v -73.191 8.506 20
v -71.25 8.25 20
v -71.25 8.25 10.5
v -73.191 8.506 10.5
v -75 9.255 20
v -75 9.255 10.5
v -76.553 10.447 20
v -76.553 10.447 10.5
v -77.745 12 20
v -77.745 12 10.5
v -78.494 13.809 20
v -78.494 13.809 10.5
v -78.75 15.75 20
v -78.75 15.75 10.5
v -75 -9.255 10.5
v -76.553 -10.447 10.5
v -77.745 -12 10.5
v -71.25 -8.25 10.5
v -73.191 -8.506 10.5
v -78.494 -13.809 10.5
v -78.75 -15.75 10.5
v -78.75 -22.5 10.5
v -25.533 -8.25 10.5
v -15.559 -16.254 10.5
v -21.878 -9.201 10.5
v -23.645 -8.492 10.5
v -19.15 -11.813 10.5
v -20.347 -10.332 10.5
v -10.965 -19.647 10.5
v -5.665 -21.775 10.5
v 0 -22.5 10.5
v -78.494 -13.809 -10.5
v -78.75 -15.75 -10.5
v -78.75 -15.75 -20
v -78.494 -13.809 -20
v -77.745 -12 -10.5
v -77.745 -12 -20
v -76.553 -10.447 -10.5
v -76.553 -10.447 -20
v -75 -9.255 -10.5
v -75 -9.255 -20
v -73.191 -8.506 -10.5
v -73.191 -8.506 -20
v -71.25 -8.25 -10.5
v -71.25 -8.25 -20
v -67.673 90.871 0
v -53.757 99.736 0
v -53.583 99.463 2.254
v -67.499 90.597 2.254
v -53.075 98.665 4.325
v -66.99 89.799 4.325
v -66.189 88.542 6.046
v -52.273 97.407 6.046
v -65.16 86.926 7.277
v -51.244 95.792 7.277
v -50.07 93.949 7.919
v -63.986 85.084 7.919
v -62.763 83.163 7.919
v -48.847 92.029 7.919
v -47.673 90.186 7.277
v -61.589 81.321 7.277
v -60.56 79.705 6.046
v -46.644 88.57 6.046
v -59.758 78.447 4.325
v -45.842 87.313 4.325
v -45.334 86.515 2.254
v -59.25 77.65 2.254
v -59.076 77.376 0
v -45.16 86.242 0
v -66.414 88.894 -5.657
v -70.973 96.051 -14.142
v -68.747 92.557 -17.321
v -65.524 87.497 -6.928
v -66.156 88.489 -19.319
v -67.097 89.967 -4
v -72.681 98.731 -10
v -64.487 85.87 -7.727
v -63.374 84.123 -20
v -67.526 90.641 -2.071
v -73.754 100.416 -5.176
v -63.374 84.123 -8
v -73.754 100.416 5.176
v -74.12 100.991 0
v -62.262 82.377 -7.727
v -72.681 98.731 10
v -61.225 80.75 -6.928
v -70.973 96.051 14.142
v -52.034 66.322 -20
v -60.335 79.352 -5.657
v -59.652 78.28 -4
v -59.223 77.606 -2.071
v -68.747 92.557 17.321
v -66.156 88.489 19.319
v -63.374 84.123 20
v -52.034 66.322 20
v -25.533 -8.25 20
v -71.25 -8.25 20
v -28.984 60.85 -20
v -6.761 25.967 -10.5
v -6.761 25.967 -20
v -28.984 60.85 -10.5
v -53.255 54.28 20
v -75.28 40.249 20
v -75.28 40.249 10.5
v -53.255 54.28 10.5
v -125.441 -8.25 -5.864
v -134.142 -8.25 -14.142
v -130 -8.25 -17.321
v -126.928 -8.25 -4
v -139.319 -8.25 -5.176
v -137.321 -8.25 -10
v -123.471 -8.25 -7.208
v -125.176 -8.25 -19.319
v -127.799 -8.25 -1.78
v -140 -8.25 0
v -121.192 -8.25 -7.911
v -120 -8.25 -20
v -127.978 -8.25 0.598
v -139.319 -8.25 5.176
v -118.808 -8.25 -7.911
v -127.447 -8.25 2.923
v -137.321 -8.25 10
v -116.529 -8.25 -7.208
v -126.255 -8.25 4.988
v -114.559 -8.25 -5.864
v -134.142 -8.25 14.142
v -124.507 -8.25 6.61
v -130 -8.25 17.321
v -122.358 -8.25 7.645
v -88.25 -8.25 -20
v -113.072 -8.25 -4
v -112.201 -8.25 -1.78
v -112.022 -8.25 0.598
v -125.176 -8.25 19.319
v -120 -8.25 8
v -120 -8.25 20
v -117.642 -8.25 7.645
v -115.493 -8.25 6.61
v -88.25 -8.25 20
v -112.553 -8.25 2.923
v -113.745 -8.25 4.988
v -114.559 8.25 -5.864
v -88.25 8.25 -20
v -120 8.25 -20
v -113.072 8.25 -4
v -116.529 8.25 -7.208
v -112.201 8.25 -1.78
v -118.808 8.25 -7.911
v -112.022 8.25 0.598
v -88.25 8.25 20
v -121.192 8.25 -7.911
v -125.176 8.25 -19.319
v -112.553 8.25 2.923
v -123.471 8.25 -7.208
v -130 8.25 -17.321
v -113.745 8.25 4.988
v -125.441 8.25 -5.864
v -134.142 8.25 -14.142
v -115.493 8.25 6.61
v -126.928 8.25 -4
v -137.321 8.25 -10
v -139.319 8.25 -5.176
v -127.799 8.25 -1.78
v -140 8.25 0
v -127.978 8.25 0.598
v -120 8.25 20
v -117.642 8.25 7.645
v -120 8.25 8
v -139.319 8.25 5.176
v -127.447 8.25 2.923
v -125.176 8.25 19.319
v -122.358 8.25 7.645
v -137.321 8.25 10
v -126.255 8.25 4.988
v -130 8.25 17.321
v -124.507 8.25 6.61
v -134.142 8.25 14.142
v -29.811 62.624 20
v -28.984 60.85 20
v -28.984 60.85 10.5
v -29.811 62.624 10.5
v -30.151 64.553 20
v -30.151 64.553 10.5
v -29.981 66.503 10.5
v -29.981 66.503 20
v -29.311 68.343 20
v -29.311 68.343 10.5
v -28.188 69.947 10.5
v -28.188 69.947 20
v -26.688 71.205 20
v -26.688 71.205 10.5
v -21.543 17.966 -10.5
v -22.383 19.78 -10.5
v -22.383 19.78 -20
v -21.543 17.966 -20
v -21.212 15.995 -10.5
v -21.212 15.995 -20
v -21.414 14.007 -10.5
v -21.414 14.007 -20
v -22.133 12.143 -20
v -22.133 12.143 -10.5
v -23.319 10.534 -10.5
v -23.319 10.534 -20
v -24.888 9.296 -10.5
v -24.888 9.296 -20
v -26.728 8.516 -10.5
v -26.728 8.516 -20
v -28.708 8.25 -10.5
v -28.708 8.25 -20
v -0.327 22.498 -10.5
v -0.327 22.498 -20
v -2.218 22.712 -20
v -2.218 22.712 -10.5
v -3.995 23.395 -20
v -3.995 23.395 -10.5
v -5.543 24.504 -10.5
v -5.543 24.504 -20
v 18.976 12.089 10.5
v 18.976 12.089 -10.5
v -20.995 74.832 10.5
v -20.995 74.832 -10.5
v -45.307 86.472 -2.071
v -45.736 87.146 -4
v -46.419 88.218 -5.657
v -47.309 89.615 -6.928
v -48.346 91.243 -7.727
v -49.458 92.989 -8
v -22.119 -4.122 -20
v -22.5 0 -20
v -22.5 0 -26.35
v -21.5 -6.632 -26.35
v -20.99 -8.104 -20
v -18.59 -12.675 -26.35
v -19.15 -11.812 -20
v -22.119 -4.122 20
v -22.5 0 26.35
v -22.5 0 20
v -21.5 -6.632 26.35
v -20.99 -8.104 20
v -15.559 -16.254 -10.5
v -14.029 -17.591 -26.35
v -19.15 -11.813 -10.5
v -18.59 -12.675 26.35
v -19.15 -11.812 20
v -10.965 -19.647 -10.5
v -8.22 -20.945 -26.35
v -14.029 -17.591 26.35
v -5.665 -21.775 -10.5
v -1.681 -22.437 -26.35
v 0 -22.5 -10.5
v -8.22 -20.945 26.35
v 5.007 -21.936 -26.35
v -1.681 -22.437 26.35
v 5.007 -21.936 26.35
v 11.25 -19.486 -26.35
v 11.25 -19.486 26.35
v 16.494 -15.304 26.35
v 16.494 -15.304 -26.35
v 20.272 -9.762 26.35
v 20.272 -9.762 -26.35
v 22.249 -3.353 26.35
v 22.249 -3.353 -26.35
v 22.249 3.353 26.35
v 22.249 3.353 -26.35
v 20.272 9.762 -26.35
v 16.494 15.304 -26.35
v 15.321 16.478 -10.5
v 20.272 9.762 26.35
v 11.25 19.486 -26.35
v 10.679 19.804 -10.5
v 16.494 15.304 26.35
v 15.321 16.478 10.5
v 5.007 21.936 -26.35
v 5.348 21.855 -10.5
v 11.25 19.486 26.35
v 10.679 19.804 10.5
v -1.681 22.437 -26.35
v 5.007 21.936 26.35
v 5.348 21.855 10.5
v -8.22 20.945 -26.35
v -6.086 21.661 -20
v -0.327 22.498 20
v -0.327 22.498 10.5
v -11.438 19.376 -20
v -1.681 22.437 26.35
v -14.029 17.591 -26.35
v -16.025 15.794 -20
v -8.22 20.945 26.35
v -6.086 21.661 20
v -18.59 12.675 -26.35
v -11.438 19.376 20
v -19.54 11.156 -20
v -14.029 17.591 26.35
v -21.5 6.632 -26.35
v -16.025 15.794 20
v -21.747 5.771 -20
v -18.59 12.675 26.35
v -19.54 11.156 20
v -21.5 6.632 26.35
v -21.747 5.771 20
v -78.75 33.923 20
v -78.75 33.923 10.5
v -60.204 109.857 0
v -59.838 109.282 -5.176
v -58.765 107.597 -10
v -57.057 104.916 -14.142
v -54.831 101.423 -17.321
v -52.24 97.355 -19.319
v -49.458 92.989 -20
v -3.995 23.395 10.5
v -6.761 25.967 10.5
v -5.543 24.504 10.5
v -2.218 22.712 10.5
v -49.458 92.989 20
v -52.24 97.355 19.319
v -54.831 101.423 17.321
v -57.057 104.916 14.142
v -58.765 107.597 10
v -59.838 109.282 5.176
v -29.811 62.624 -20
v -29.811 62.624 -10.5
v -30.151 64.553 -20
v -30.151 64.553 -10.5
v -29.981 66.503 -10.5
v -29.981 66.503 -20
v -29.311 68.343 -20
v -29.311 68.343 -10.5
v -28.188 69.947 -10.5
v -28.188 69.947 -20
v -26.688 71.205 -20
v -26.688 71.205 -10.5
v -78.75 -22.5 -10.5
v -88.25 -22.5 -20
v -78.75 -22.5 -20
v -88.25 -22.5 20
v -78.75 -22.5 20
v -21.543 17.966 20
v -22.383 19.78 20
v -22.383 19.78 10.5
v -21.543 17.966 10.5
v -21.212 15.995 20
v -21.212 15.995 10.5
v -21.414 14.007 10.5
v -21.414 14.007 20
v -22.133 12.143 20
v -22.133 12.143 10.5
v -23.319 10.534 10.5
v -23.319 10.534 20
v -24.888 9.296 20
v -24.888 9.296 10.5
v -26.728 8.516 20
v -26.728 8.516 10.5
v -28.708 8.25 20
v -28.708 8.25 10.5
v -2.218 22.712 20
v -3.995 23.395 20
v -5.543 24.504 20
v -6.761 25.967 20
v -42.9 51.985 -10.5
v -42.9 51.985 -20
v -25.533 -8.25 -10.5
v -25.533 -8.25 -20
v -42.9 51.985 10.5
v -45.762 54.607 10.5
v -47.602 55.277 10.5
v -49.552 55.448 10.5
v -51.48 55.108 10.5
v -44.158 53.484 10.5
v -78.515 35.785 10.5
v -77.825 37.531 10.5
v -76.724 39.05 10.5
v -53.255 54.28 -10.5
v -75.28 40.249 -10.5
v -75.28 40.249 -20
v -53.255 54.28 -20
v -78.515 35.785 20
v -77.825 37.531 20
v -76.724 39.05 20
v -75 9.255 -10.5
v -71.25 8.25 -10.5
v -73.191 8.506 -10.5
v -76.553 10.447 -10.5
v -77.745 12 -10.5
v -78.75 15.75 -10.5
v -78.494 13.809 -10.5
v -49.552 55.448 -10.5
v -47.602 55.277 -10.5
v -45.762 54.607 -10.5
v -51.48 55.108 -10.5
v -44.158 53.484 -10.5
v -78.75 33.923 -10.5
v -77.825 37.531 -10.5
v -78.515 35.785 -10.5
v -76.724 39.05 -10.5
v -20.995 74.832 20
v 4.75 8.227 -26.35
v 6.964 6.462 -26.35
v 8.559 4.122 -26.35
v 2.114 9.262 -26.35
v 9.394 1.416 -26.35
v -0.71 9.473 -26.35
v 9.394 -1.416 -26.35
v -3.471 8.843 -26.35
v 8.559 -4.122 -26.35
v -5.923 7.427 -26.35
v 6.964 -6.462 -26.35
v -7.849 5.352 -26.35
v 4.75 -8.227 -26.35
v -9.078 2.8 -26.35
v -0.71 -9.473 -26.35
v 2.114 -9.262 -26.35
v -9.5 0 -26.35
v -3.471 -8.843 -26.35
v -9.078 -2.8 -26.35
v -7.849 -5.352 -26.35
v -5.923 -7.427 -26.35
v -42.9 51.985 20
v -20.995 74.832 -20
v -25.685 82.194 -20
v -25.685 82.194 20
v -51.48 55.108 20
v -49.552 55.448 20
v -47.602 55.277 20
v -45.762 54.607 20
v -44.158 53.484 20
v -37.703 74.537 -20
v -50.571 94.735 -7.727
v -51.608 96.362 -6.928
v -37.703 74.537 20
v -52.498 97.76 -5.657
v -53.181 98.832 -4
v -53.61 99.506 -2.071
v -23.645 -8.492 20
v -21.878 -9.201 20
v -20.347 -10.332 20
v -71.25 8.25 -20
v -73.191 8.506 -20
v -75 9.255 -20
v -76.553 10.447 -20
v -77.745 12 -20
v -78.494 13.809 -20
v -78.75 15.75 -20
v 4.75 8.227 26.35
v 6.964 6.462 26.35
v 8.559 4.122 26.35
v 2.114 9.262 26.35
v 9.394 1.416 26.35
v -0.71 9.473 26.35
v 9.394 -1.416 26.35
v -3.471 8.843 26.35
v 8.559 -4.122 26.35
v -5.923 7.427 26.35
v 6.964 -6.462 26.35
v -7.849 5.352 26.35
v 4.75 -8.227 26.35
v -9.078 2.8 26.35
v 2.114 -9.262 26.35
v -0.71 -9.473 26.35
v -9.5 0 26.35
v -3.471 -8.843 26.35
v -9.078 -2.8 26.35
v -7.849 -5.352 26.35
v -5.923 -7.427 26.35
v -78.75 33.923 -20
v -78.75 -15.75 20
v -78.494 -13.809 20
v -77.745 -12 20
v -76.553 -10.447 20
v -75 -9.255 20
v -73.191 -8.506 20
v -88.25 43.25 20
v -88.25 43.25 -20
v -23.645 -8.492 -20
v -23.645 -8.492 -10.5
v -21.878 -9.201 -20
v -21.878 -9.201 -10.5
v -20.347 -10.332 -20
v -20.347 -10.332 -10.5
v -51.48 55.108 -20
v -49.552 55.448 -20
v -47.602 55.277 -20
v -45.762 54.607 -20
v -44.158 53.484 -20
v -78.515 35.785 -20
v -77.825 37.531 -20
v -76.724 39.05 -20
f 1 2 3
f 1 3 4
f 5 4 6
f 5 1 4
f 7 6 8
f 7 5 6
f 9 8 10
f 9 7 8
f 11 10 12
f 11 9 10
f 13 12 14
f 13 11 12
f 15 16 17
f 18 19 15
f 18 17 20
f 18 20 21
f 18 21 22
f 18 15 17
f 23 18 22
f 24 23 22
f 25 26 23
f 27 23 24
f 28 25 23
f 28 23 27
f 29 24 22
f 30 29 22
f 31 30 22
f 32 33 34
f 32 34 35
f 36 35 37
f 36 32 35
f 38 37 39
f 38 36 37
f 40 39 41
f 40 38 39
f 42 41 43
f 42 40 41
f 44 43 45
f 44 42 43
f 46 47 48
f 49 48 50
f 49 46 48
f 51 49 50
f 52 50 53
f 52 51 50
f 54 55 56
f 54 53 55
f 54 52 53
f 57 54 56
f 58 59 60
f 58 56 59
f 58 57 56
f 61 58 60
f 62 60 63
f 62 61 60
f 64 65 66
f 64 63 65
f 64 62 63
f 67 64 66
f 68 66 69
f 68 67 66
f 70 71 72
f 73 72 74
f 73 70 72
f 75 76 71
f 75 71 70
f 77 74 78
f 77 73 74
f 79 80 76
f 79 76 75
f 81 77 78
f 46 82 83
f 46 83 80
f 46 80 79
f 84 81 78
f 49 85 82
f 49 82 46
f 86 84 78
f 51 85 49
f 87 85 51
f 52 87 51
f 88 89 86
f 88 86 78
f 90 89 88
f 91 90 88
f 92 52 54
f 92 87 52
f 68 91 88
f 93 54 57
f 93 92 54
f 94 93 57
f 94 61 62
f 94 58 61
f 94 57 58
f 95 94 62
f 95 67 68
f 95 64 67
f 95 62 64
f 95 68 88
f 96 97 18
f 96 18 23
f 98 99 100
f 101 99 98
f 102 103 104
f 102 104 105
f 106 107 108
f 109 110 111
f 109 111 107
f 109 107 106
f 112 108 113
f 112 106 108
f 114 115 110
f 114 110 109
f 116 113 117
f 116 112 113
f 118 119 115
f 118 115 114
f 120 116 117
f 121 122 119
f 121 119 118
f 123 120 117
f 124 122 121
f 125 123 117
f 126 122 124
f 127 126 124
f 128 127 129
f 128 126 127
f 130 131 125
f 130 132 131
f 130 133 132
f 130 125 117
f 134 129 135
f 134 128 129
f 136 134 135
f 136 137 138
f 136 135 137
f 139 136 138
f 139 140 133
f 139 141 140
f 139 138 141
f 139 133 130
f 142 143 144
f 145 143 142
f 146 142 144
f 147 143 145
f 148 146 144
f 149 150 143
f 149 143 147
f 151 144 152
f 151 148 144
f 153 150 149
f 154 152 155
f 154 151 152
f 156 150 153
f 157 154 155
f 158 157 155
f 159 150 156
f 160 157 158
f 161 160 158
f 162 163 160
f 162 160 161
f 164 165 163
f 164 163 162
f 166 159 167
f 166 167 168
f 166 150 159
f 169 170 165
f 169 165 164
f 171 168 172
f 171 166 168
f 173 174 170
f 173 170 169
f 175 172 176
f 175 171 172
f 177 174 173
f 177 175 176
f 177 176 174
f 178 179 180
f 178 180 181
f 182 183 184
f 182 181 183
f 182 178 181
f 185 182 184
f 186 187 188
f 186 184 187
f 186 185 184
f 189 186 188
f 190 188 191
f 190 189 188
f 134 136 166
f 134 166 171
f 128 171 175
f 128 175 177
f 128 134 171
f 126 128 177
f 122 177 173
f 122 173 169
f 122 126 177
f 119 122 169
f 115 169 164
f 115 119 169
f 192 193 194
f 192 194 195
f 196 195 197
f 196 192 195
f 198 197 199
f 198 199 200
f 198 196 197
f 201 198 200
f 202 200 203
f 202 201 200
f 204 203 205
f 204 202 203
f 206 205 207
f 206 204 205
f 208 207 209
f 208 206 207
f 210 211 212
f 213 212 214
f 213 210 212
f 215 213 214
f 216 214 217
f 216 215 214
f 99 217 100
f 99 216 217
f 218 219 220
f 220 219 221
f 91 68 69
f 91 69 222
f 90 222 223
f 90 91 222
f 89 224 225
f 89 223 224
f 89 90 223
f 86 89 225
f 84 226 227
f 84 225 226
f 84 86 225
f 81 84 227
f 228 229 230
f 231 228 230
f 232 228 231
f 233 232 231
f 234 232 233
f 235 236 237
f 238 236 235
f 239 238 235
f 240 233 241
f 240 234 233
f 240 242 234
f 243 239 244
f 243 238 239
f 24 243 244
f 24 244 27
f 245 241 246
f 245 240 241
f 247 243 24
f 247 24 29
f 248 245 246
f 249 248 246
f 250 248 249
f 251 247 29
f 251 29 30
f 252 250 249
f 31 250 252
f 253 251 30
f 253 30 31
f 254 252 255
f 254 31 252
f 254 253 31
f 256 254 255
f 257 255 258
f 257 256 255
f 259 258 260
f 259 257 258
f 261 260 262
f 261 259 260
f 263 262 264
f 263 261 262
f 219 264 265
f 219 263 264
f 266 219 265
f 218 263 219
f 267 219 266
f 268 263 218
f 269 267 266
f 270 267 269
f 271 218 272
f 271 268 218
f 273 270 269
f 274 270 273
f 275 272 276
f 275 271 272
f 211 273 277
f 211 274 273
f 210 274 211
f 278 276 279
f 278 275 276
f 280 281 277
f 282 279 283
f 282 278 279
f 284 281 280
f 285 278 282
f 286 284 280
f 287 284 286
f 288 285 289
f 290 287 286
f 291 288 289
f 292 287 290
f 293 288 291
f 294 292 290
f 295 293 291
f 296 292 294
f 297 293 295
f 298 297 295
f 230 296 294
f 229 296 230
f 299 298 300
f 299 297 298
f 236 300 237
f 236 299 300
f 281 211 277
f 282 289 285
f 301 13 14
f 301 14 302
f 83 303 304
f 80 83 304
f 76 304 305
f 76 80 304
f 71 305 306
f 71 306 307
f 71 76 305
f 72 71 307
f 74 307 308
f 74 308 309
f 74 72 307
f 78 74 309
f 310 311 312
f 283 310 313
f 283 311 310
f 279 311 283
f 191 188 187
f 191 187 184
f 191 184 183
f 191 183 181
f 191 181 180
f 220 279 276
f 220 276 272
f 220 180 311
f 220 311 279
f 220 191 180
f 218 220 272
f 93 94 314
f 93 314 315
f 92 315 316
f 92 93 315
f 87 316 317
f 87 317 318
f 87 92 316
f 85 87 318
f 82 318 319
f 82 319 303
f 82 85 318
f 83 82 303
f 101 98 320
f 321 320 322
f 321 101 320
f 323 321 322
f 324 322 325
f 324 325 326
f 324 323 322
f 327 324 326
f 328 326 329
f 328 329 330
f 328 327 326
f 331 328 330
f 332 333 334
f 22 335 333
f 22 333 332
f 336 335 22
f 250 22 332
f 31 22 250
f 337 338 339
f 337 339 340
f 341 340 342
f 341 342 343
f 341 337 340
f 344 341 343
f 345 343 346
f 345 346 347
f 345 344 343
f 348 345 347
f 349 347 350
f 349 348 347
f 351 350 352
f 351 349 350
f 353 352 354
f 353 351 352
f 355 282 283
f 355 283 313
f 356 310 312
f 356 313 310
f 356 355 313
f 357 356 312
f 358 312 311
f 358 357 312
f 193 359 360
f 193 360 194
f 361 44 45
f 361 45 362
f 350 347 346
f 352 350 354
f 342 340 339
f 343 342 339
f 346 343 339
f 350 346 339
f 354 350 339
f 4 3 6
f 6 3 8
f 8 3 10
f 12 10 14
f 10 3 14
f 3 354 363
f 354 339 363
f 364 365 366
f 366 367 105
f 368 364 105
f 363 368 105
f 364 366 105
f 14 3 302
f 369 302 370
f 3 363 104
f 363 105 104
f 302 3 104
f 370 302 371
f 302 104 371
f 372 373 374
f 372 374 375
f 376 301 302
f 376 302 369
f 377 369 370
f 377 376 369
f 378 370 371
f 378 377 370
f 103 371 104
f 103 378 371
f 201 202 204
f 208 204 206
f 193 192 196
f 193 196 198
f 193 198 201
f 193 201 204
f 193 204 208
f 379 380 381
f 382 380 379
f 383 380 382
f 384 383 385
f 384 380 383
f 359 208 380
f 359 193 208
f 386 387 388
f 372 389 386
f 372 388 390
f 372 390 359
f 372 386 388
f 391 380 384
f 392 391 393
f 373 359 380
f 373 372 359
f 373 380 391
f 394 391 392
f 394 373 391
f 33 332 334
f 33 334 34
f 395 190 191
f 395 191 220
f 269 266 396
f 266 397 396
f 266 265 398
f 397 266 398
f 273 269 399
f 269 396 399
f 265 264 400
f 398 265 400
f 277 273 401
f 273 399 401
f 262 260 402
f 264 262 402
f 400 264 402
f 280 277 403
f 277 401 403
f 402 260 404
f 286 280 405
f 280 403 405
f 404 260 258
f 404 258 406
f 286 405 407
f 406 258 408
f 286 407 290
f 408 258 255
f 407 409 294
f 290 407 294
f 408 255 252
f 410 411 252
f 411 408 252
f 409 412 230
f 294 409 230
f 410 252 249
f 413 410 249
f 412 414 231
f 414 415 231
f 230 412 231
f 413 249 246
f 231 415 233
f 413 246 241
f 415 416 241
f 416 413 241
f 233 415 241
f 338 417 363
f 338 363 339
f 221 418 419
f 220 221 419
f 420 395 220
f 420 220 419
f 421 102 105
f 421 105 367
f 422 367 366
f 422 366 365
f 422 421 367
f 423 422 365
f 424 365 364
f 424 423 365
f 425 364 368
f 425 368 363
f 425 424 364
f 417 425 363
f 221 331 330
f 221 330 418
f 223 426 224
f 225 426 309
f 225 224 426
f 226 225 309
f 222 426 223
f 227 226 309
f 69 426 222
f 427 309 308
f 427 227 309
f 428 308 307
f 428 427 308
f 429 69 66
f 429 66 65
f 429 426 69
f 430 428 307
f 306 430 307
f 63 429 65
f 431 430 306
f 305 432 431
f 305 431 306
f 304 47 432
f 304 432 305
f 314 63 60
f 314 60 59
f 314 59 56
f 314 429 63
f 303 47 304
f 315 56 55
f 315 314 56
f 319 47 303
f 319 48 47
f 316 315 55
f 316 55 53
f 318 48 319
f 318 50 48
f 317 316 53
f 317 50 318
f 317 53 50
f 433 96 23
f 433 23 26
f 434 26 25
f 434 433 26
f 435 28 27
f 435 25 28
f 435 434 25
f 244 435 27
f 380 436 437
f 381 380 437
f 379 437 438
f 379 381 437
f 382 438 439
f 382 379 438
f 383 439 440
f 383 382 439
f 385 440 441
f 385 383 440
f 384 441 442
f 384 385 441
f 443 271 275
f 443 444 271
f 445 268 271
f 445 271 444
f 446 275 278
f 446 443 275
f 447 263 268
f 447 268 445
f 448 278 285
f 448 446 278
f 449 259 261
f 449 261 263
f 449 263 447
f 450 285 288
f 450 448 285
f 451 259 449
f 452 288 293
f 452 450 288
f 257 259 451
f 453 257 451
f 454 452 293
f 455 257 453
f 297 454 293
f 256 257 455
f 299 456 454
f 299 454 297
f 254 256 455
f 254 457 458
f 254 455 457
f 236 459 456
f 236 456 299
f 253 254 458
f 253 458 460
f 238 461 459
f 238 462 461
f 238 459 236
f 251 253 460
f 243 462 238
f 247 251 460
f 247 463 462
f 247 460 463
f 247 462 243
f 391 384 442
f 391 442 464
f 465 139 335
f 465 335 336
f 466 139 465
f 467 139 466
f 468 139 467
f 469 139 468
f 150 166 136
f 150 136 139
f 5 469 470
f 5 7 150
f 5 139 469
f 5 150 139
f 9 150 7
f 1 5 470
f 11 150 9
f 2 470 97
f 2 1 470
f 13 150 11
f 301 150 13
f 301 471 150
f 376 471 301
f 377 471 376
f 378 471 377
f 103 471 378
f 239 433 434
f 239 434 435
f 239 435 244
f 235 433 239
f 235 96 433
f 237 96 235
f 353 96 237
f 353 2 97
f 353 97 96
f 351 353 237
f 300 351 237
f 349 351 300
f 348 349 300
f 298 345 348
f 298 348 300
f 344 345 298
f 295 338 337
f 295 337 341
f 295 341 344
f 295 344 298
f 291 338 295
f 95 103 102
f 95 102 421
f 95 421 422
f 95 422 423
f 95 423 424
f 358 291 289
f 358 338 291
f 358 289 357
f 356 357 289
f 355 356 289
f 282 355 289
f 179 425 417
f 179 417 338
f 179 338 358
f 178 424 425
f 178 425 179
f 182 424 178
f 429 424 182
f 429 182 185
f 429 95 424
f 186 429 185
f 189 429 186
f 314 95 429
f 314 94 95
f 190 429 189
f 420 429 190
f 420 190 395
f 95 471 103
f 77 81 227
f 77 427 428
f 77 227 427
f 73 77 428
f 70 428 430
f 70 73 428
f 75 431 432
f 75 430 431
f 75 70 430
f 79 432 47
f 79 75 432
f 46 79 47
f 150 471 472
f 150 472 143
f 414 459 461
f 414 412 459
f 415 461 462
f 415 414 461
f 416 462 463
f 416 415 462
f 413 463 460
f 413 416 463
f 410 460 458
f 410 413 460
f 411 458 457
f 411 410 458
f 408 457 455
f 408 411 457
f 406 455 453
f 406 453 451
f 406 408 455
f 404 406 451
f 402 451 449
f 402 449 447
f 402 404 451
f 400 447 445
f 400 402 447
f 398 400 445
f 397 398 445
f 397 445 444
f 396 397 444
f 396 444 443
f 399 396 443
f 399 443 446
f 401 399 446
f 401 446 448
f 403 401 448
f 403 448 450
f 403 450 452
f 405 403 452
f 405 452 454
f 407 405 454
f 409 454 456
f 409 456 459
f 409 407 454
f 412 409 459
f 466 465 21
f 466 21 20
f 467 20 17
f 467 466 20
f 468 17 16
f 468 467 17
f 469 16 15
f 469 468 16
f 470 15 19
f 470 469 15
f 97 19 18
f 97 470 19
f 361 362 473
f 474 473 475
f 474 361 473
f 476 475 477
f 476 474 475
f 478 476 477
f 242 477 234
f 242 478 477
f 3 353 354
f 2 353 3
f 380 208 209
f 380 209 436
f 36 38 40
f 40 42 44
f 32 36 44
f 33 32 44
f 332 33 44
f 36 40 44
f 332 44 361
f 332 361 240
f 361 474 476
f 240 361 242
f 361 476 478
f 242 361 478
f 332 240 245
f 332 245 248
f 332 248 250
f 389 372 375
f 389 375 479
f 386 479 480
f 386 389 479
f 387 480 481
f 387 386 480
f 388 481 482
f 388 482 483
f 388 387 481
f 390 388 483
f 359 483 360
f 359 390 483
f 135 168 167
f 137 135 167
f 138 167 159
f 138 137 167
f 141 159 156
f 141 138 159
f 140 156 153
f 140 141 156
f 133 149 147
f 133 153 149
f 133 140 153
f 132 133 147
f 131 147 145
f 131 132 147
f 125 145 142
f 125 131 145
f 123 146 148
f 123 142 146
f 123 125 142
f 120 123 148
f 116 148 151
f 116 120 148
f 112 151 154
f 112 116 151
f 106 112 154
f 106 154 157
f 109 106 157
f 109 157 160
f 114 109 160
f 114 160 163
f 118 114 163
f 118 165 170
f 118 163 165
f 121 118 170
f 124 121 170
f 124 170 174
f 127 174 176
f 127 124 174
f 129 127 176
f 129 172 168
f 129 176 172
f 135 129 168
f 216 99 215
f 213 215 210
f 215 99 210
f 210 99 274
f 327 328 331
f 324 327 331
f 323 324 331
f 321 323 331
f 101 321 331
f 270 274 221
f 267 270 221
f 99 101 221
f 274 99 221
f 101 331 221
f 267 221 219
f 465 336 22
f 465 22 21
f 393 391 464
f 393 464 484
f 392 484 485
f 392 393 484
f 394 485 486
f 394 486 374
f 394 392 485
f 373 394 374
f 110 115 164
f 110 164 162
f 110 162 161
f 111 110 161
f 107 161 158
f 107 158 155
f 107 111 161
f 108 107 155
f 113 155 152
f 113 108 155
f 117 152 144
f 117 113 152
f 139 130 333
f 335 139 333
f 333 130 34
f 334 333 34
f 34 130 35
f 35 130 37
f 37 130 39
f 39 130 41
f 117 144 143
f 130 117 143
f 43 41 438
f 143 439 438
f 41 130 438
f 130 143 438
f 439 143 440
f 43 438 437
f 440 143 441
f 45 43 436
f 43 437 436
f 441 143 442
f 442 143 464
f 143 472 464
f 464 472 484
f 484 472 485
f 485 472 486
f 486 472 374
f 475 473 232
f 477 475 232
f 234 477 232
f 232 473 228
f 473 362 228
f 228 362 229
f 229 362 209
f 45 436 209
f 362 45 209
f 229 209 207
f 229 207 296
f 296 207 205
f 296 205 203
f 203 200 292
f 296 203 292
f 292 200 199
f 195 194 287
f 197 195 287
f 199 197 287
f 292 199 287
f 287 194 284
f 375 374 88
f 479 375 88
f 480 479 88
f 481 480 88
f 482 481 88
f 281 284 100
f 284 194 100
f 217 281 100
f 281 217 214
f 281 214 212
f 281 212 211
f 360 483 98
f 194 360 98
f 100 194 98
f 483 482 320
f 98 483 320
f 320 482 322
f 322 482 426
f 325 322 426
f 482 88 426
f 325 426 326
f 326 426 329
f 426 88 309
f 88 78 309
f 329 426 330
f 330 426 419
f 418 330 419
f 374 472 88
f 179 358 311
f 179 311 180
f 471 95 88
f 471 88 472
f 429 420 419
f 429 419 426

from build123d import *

# Parameters (mm, degrees)
SKETCH1_R               = 9.499999999999995
BOSS_EXTRUDE1_DEPTH     = 26.35
BOSS_EXTRUDE2_DEPTH     = 20
BOSS_EXTRUDE3_DEPTH     = 10.5
CUT_EXTRUDE1_DEPTH      = 180.89665532608137
CUT_EXTRUDE1_DEPTH_BACK = 180.89665532608137
SKETCH2_R               = 7.999999999999998
CUT_EXTRUDE2_DEPTH      = 183.77082750646198
CUT_EXTRUDE2_DEPTH_BACK = 183.77082750646198
SKETCH4_R               = 7.999999999999996


with BuildPart() as part:
    # Sketch1 → Boss-Extrude1 (new, symmetric)
    with BuildSketch(Plane.XY):
        with BuildLine():
            ThreePointArc((22.5, 0), (21.601121723683402, 6.296152815697305), (18.976307530789946, 12.089241187803507))
            ThreePointArc((18.976307530789946, 12.089241187803507), (10.67878079531028, 19.804384381386672), (-0.3266186383022837, 22.49762921432197))
            ThreePointArc((-0.3266186383022837, 22.49762921432197), (-19.726352003418917, 10.82224730068624), (-19.14980009686784, -11.812500000000023))
            ThreePointArc((-19.149800096867843, -11.812500000000012), (-10.965143637910074, -19.64728034614461), (-4.13e-15, -22.5))
            ThreePointArc((-4.13e-15, -22.5), (15.909902576697315, -15.909902576697323), (22.5, -5.51e-15))
        make_face()
        Circle(SKETCH1_R, mode=Mode.SUBTRACT)
    extrude(amount=BOSS_EXTRUDE1_DEPTH, both=True)

    # Sketch1<3> → Boss-Extrude2 (add, symmetric)
    with BuildSketch(Plane.XY):
        with BuildLine():
            Line((-26.68811354451123, 71.20520110937484), (-20.99522128527427, 74.83197346571588))
            Line((-20.995221285274297, 74.83197346571585), (-25.68506516240018, 82.19355375857313))
            Line((-25.68506516240017, 82.19355375857313), (-37.70339326523374, 74.53703433963095))
            Line((-37.70339326523374, 74.53703433963095), (-60.20447161539646, 109.85665249547212))
            Line((-60.20447161539646, 109.85665249547212), (-74.12043047130908, 100.99120895774956))
            Line((-74.12043047130908, 100.99120895774956), (-52.033854523315306, 66.32222924427353))
            Line((-52.033854523315306, 66.32222924427353), (-88.25, 43.25))
            Line((-88.25, 43.25), (-88.25000000000001, 8.249999999999986))
            Line((-88.25000000000001, 8.24999999999999), (-140, 8.249999999999982))
            Line((-140, 8.249999999999982), (-140, -8.250000000000018))
            Line((-140, -8.250000000000018), (-88.25000000000001, -8.25000000000001))
            Line((-88.25000000000001, -8.25000000000001), (-88.24999999999999, -22.5))
            Line((-88.24999999999999, -22.5), (-78.74999999999999, -22.5))
            Line((-78.74999999999999, -22.5), (-78.75, -15.750000000000018))
            ThreePointArc((-78.75, -15.750000000000018), (-76.5533008588991, -10.44669914110092), (-71.25000000000001, -8.250000000000018))
            Line((-71.25000000000001, -8.250000000000018), (-25.533066795823785, -8.250000000000018))
            ThreePointArc((-25.53306679582379, -8.250000000000018), (-21.878018916520432, -9.200906551285149), (-19.149800096867843, -11.812500000000014))
            ThreePointArc((-19.14980009686784, -11.812500000000023), (-19.726352003418917, 10.82224730068624), (-0.3266186383022837, 22.49762921432197))
            ThreePointArc((-0.3266186383022812, 22.497629214321968), (-3.99508511617313, 23.395377491967075), (-6.7609273613330165, 25.967091889828126))
            Line((-6.760927361333014, 25.967091889828126), (-28.98380232550672, 60.850018203177015))
            ThreePointArc((-28.983802325506723, 60.850018203177015), (-29.980586535309566, 66.50306237031397), (-26.688113544511225, 71.20520110937484))
        make_face()
        with BuildLine():
            ThreePointArc((-53.25494408761715, 54.28026344644994), (-47.60189992048019, 55.27704765625279), (-42.89976118141933, 51.98457466545446))
            Line((-42.89976118141933, 51.98457466545446), (-22.38302326120931, 19.77974706260116))
            ThreePointArc((-22.383023261209313, 19.77974706260116), (-22.13300843699966, 12.142584233104584), (-28.70845910480596, 8.25))
            Line((-28.70845910480596, 8.249999999999998), (-71.25000000000001, 8.249999999999991))
            ThreePointArc((-71.25000000000001, 8.249999999999993), (-76.55330085889912, 10.446699141100883), (-78.75, 15.749999999999993))
            Line((-78.75, 15.749999999999993), (-78.75, 33.92348062734661))
            ThreePointArc((-78.75, 33.92348062734661), (-77.82545066780631, 37.53089639424201), (-75.27974706260119, 40.24891647094325))
            Line((-75.27974706260119, 40.24891647094325), (-53.25494408761715, 54.28026344644994))
        make_face(mode=Mode.SUBTRACT)
    extrude(amount=BOSS_EXTRUDE2_DEPTH, both=True)

    # Sketch1<4> → Boss-Extrude3 (add, symmetric)
    with BuildSketch(Plane.XY):
        with BuildLine():
            ThreePointArc((-0.3266186383022837, 22.49762921432197), (10.67878079531028, 19.804384381386672), (18.976307530789946, 12.089241187803507))
            Line((18.976307530789953, 12.08924118780351), (-20.995221285274297, 74.83197346571585))
            Line((-20.99522128527427, 74.83197346571588), (-26.68811354451123, 71.20520110937484))
            ThreePointArc((-26.688113544511225, 71.20520110937484), (-29.980586535309566, 66.50306237031397), (-28.983802325506723, 60.850018203177015))
            Line((-28.98380232550672, 60.850018203177015), (-6.760927361333014, 25.967091889828126))
            ThreePointArc((-6.7609273613330165, 25.967091889828126), (-3.99508511617313, 23.395377491967075), (-0.3266186383022812, 22.497629214321968))
        make_face()
        with BuildLine():
            Line((-78.74999999999999, -22.5), (0, -22.5))
            ThreePointArc((-4.13e-15, -22.5), (-10.965143637910074, -19.64728034614461), (-19.149800096867843, -11.812500000000012))
            ThreePointArc((-19.149800096867843, -11.812500000000014), (-21.878018916520432, -9.200906551285149), (-25.53306679582379, -8.250000000000018))
            Line((-25.533066795823785, -8.250000000000018), (-71.25000000000001, -8.250000000000018))
            ThreePointArc((-71.25000000000001, -8.250000000000018), (-76.5533008588991, -10.44669914110092), (-78.75, -15.750000000000018))
            Line((-78.75, -15.750000000000018), (-78.74999999999999, -22.5))
        make_face()
        with BuildLine():
            Line((-22.38302326120931, 19.77974706260116), (-42.89976118141933, 51.98457466545446))
            ThreePointArc((-42.89976118141933, 51.98457466545446), (-47.60189992048019, 55.27704765625279), (-53.25494408761715, 54.28026344644994))
            Line((-53.25494408761715, 54.28026344644994), (-75.27974706260119, 40.24891647094325))
            ThreePointArc((-75.27974706260119, 40.24891647094325), (-77.82545066780631, 37.53089639424201), (-78.75, 33.92348062734661))
            Line((-78.75, 33.92348062734661), (-78.75, 15.749999999999993))
            ThreePointArc((-78.75, 15.749999999999993), (-76.55330085889912, 10.446699141100883), (-71.25000000000001, 8.249999999999993))
            Line((-71.25000000000001, 8.249999999999991), (-28.70845910480596, 8.249999999999998))
            ThreePointArc((-28.70845910480596, 8.25), (-22.13300843699966, 12.142584233104584), (-22.383023261209313, 19.77974706260116))
        make_face()
    extrude(amount=BOSS_EXTRUDE3_DEPTH, both=True)

    # Sketch2 → Cut-Extrude1 (cut, two sides: drawn at the far end of the back side and taken through both)
    with BuildSketch(Plane(origin=(0, 0, 0), x_dir=(1, 0, 0), z_dir=(0, 1, 0)).offset(-CUT_EXTRUDE1_DEPTH_BACK)):
        with BuildLine():
            Line((-140, -20), (-120, -20))
            ThreePointArc((-120, -20), (-134.142135661811, -14.142135585650896), (-140, 1.077066557e-07))
            Line((-140, 1.0770665426e-07), (-140, -20))
        make_face()
        with BuildLine():
            ThreePointArc((-140, 1.077066557e-07), (-134.1421355856509, 14.142135661811004), (-120, 20))
            Line((-120, 20.000000000000004), (-140, 20))
            Line((-140, 20), (-140, 1.0770665426e-07))
        make_face()
        with Locations((-120, 0)):
            Circle(SKETCH2_R)
    extrude(amount=CUT_EXTRUDE1_DEPTH + CUT_EXTRUDE1_DEPTH_BACK, mode=Mode.SUBTRACT)

    # Sketch4 → Cut-Extrude2 (cut, two sides: drawn at the far end of the back side and taken through both)
    with BuildSketch(Plane(origin=(6.957979427956333, 4.432721768861295, 0), x_dir=(0, 0, -1), z_dir=(0.8433914458128867, 0.5372996083468223, 0)).offset(-CUT_EXTRUDE2_DEPTH_BACK)):
        with Locations((1.532e-14, 105)):
            Circle(SKETCH4_R)
        with BuildLine():
            ThreePointArc((-4.308254075e-08, 125), (14.142135608498972, 119.14213563896293), (20, 105))
            Line((20, 105), (20, 125))
            Line((20, 125), (-4.30825402e-08, 125))
        make_face()
        with BuildLine():
            ThreePointArc((-20, 105), (-14.142135638962932, 119.14213560849896), (-4.308254075e-08, 125))
            Line((-4.30825402e-08, 125), (-20, 125))
            Line((-20, 125), (-19.999999999999996, 105))
        make_face()
    extrude(amount=CUT_EXTRUDE2_DEPTH + CUT_EXTRUDE2_DEPTH_BACK, mode=Mode.SUBTRACT)


solid = part.part
